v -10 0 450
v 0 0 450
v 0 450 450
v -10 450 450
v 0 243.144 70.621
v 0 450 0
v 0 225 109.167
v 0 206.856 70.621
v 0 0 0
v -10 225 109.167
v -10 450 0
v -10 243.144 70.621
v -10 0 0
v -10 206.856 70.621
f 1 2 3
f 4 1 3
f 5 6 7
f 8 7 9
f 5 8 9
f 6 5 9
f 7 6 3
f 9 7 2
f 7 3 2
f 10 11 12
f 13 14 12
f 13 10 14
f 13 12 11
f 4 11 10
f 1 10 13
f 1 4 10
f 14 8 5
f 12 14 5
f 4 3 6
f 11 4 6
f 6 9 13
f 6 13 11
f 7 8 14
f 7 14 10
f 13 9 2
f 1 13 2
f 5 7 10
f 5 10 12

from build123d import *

# Parameters (mm, degrees)
PAD_DEPTH    = 10
POCKET_DEPTH = 10.001


with BuildPart() as part:
    # Sketch → Pad (new body)
    with BuildSketch(Plane.YZ):
        Polygon((0, 0), (0, 450), (450, 450), (450, 0), (225, 0), align=None)
    extrude(amount=-PAD_DEPTH)

    # Sketch001 → Pocket (cut, through all)
    with BuildSketch(Plane.YZ):
        Polygon((225, 70.62109), (206.855669, 70.62109), (225, 109.167255), (243.144331, 70.62109), align=None)
    extrude(amount=-POCKET_DEPTH, mode=Mode.SUBTRACT)


solid = part.part
